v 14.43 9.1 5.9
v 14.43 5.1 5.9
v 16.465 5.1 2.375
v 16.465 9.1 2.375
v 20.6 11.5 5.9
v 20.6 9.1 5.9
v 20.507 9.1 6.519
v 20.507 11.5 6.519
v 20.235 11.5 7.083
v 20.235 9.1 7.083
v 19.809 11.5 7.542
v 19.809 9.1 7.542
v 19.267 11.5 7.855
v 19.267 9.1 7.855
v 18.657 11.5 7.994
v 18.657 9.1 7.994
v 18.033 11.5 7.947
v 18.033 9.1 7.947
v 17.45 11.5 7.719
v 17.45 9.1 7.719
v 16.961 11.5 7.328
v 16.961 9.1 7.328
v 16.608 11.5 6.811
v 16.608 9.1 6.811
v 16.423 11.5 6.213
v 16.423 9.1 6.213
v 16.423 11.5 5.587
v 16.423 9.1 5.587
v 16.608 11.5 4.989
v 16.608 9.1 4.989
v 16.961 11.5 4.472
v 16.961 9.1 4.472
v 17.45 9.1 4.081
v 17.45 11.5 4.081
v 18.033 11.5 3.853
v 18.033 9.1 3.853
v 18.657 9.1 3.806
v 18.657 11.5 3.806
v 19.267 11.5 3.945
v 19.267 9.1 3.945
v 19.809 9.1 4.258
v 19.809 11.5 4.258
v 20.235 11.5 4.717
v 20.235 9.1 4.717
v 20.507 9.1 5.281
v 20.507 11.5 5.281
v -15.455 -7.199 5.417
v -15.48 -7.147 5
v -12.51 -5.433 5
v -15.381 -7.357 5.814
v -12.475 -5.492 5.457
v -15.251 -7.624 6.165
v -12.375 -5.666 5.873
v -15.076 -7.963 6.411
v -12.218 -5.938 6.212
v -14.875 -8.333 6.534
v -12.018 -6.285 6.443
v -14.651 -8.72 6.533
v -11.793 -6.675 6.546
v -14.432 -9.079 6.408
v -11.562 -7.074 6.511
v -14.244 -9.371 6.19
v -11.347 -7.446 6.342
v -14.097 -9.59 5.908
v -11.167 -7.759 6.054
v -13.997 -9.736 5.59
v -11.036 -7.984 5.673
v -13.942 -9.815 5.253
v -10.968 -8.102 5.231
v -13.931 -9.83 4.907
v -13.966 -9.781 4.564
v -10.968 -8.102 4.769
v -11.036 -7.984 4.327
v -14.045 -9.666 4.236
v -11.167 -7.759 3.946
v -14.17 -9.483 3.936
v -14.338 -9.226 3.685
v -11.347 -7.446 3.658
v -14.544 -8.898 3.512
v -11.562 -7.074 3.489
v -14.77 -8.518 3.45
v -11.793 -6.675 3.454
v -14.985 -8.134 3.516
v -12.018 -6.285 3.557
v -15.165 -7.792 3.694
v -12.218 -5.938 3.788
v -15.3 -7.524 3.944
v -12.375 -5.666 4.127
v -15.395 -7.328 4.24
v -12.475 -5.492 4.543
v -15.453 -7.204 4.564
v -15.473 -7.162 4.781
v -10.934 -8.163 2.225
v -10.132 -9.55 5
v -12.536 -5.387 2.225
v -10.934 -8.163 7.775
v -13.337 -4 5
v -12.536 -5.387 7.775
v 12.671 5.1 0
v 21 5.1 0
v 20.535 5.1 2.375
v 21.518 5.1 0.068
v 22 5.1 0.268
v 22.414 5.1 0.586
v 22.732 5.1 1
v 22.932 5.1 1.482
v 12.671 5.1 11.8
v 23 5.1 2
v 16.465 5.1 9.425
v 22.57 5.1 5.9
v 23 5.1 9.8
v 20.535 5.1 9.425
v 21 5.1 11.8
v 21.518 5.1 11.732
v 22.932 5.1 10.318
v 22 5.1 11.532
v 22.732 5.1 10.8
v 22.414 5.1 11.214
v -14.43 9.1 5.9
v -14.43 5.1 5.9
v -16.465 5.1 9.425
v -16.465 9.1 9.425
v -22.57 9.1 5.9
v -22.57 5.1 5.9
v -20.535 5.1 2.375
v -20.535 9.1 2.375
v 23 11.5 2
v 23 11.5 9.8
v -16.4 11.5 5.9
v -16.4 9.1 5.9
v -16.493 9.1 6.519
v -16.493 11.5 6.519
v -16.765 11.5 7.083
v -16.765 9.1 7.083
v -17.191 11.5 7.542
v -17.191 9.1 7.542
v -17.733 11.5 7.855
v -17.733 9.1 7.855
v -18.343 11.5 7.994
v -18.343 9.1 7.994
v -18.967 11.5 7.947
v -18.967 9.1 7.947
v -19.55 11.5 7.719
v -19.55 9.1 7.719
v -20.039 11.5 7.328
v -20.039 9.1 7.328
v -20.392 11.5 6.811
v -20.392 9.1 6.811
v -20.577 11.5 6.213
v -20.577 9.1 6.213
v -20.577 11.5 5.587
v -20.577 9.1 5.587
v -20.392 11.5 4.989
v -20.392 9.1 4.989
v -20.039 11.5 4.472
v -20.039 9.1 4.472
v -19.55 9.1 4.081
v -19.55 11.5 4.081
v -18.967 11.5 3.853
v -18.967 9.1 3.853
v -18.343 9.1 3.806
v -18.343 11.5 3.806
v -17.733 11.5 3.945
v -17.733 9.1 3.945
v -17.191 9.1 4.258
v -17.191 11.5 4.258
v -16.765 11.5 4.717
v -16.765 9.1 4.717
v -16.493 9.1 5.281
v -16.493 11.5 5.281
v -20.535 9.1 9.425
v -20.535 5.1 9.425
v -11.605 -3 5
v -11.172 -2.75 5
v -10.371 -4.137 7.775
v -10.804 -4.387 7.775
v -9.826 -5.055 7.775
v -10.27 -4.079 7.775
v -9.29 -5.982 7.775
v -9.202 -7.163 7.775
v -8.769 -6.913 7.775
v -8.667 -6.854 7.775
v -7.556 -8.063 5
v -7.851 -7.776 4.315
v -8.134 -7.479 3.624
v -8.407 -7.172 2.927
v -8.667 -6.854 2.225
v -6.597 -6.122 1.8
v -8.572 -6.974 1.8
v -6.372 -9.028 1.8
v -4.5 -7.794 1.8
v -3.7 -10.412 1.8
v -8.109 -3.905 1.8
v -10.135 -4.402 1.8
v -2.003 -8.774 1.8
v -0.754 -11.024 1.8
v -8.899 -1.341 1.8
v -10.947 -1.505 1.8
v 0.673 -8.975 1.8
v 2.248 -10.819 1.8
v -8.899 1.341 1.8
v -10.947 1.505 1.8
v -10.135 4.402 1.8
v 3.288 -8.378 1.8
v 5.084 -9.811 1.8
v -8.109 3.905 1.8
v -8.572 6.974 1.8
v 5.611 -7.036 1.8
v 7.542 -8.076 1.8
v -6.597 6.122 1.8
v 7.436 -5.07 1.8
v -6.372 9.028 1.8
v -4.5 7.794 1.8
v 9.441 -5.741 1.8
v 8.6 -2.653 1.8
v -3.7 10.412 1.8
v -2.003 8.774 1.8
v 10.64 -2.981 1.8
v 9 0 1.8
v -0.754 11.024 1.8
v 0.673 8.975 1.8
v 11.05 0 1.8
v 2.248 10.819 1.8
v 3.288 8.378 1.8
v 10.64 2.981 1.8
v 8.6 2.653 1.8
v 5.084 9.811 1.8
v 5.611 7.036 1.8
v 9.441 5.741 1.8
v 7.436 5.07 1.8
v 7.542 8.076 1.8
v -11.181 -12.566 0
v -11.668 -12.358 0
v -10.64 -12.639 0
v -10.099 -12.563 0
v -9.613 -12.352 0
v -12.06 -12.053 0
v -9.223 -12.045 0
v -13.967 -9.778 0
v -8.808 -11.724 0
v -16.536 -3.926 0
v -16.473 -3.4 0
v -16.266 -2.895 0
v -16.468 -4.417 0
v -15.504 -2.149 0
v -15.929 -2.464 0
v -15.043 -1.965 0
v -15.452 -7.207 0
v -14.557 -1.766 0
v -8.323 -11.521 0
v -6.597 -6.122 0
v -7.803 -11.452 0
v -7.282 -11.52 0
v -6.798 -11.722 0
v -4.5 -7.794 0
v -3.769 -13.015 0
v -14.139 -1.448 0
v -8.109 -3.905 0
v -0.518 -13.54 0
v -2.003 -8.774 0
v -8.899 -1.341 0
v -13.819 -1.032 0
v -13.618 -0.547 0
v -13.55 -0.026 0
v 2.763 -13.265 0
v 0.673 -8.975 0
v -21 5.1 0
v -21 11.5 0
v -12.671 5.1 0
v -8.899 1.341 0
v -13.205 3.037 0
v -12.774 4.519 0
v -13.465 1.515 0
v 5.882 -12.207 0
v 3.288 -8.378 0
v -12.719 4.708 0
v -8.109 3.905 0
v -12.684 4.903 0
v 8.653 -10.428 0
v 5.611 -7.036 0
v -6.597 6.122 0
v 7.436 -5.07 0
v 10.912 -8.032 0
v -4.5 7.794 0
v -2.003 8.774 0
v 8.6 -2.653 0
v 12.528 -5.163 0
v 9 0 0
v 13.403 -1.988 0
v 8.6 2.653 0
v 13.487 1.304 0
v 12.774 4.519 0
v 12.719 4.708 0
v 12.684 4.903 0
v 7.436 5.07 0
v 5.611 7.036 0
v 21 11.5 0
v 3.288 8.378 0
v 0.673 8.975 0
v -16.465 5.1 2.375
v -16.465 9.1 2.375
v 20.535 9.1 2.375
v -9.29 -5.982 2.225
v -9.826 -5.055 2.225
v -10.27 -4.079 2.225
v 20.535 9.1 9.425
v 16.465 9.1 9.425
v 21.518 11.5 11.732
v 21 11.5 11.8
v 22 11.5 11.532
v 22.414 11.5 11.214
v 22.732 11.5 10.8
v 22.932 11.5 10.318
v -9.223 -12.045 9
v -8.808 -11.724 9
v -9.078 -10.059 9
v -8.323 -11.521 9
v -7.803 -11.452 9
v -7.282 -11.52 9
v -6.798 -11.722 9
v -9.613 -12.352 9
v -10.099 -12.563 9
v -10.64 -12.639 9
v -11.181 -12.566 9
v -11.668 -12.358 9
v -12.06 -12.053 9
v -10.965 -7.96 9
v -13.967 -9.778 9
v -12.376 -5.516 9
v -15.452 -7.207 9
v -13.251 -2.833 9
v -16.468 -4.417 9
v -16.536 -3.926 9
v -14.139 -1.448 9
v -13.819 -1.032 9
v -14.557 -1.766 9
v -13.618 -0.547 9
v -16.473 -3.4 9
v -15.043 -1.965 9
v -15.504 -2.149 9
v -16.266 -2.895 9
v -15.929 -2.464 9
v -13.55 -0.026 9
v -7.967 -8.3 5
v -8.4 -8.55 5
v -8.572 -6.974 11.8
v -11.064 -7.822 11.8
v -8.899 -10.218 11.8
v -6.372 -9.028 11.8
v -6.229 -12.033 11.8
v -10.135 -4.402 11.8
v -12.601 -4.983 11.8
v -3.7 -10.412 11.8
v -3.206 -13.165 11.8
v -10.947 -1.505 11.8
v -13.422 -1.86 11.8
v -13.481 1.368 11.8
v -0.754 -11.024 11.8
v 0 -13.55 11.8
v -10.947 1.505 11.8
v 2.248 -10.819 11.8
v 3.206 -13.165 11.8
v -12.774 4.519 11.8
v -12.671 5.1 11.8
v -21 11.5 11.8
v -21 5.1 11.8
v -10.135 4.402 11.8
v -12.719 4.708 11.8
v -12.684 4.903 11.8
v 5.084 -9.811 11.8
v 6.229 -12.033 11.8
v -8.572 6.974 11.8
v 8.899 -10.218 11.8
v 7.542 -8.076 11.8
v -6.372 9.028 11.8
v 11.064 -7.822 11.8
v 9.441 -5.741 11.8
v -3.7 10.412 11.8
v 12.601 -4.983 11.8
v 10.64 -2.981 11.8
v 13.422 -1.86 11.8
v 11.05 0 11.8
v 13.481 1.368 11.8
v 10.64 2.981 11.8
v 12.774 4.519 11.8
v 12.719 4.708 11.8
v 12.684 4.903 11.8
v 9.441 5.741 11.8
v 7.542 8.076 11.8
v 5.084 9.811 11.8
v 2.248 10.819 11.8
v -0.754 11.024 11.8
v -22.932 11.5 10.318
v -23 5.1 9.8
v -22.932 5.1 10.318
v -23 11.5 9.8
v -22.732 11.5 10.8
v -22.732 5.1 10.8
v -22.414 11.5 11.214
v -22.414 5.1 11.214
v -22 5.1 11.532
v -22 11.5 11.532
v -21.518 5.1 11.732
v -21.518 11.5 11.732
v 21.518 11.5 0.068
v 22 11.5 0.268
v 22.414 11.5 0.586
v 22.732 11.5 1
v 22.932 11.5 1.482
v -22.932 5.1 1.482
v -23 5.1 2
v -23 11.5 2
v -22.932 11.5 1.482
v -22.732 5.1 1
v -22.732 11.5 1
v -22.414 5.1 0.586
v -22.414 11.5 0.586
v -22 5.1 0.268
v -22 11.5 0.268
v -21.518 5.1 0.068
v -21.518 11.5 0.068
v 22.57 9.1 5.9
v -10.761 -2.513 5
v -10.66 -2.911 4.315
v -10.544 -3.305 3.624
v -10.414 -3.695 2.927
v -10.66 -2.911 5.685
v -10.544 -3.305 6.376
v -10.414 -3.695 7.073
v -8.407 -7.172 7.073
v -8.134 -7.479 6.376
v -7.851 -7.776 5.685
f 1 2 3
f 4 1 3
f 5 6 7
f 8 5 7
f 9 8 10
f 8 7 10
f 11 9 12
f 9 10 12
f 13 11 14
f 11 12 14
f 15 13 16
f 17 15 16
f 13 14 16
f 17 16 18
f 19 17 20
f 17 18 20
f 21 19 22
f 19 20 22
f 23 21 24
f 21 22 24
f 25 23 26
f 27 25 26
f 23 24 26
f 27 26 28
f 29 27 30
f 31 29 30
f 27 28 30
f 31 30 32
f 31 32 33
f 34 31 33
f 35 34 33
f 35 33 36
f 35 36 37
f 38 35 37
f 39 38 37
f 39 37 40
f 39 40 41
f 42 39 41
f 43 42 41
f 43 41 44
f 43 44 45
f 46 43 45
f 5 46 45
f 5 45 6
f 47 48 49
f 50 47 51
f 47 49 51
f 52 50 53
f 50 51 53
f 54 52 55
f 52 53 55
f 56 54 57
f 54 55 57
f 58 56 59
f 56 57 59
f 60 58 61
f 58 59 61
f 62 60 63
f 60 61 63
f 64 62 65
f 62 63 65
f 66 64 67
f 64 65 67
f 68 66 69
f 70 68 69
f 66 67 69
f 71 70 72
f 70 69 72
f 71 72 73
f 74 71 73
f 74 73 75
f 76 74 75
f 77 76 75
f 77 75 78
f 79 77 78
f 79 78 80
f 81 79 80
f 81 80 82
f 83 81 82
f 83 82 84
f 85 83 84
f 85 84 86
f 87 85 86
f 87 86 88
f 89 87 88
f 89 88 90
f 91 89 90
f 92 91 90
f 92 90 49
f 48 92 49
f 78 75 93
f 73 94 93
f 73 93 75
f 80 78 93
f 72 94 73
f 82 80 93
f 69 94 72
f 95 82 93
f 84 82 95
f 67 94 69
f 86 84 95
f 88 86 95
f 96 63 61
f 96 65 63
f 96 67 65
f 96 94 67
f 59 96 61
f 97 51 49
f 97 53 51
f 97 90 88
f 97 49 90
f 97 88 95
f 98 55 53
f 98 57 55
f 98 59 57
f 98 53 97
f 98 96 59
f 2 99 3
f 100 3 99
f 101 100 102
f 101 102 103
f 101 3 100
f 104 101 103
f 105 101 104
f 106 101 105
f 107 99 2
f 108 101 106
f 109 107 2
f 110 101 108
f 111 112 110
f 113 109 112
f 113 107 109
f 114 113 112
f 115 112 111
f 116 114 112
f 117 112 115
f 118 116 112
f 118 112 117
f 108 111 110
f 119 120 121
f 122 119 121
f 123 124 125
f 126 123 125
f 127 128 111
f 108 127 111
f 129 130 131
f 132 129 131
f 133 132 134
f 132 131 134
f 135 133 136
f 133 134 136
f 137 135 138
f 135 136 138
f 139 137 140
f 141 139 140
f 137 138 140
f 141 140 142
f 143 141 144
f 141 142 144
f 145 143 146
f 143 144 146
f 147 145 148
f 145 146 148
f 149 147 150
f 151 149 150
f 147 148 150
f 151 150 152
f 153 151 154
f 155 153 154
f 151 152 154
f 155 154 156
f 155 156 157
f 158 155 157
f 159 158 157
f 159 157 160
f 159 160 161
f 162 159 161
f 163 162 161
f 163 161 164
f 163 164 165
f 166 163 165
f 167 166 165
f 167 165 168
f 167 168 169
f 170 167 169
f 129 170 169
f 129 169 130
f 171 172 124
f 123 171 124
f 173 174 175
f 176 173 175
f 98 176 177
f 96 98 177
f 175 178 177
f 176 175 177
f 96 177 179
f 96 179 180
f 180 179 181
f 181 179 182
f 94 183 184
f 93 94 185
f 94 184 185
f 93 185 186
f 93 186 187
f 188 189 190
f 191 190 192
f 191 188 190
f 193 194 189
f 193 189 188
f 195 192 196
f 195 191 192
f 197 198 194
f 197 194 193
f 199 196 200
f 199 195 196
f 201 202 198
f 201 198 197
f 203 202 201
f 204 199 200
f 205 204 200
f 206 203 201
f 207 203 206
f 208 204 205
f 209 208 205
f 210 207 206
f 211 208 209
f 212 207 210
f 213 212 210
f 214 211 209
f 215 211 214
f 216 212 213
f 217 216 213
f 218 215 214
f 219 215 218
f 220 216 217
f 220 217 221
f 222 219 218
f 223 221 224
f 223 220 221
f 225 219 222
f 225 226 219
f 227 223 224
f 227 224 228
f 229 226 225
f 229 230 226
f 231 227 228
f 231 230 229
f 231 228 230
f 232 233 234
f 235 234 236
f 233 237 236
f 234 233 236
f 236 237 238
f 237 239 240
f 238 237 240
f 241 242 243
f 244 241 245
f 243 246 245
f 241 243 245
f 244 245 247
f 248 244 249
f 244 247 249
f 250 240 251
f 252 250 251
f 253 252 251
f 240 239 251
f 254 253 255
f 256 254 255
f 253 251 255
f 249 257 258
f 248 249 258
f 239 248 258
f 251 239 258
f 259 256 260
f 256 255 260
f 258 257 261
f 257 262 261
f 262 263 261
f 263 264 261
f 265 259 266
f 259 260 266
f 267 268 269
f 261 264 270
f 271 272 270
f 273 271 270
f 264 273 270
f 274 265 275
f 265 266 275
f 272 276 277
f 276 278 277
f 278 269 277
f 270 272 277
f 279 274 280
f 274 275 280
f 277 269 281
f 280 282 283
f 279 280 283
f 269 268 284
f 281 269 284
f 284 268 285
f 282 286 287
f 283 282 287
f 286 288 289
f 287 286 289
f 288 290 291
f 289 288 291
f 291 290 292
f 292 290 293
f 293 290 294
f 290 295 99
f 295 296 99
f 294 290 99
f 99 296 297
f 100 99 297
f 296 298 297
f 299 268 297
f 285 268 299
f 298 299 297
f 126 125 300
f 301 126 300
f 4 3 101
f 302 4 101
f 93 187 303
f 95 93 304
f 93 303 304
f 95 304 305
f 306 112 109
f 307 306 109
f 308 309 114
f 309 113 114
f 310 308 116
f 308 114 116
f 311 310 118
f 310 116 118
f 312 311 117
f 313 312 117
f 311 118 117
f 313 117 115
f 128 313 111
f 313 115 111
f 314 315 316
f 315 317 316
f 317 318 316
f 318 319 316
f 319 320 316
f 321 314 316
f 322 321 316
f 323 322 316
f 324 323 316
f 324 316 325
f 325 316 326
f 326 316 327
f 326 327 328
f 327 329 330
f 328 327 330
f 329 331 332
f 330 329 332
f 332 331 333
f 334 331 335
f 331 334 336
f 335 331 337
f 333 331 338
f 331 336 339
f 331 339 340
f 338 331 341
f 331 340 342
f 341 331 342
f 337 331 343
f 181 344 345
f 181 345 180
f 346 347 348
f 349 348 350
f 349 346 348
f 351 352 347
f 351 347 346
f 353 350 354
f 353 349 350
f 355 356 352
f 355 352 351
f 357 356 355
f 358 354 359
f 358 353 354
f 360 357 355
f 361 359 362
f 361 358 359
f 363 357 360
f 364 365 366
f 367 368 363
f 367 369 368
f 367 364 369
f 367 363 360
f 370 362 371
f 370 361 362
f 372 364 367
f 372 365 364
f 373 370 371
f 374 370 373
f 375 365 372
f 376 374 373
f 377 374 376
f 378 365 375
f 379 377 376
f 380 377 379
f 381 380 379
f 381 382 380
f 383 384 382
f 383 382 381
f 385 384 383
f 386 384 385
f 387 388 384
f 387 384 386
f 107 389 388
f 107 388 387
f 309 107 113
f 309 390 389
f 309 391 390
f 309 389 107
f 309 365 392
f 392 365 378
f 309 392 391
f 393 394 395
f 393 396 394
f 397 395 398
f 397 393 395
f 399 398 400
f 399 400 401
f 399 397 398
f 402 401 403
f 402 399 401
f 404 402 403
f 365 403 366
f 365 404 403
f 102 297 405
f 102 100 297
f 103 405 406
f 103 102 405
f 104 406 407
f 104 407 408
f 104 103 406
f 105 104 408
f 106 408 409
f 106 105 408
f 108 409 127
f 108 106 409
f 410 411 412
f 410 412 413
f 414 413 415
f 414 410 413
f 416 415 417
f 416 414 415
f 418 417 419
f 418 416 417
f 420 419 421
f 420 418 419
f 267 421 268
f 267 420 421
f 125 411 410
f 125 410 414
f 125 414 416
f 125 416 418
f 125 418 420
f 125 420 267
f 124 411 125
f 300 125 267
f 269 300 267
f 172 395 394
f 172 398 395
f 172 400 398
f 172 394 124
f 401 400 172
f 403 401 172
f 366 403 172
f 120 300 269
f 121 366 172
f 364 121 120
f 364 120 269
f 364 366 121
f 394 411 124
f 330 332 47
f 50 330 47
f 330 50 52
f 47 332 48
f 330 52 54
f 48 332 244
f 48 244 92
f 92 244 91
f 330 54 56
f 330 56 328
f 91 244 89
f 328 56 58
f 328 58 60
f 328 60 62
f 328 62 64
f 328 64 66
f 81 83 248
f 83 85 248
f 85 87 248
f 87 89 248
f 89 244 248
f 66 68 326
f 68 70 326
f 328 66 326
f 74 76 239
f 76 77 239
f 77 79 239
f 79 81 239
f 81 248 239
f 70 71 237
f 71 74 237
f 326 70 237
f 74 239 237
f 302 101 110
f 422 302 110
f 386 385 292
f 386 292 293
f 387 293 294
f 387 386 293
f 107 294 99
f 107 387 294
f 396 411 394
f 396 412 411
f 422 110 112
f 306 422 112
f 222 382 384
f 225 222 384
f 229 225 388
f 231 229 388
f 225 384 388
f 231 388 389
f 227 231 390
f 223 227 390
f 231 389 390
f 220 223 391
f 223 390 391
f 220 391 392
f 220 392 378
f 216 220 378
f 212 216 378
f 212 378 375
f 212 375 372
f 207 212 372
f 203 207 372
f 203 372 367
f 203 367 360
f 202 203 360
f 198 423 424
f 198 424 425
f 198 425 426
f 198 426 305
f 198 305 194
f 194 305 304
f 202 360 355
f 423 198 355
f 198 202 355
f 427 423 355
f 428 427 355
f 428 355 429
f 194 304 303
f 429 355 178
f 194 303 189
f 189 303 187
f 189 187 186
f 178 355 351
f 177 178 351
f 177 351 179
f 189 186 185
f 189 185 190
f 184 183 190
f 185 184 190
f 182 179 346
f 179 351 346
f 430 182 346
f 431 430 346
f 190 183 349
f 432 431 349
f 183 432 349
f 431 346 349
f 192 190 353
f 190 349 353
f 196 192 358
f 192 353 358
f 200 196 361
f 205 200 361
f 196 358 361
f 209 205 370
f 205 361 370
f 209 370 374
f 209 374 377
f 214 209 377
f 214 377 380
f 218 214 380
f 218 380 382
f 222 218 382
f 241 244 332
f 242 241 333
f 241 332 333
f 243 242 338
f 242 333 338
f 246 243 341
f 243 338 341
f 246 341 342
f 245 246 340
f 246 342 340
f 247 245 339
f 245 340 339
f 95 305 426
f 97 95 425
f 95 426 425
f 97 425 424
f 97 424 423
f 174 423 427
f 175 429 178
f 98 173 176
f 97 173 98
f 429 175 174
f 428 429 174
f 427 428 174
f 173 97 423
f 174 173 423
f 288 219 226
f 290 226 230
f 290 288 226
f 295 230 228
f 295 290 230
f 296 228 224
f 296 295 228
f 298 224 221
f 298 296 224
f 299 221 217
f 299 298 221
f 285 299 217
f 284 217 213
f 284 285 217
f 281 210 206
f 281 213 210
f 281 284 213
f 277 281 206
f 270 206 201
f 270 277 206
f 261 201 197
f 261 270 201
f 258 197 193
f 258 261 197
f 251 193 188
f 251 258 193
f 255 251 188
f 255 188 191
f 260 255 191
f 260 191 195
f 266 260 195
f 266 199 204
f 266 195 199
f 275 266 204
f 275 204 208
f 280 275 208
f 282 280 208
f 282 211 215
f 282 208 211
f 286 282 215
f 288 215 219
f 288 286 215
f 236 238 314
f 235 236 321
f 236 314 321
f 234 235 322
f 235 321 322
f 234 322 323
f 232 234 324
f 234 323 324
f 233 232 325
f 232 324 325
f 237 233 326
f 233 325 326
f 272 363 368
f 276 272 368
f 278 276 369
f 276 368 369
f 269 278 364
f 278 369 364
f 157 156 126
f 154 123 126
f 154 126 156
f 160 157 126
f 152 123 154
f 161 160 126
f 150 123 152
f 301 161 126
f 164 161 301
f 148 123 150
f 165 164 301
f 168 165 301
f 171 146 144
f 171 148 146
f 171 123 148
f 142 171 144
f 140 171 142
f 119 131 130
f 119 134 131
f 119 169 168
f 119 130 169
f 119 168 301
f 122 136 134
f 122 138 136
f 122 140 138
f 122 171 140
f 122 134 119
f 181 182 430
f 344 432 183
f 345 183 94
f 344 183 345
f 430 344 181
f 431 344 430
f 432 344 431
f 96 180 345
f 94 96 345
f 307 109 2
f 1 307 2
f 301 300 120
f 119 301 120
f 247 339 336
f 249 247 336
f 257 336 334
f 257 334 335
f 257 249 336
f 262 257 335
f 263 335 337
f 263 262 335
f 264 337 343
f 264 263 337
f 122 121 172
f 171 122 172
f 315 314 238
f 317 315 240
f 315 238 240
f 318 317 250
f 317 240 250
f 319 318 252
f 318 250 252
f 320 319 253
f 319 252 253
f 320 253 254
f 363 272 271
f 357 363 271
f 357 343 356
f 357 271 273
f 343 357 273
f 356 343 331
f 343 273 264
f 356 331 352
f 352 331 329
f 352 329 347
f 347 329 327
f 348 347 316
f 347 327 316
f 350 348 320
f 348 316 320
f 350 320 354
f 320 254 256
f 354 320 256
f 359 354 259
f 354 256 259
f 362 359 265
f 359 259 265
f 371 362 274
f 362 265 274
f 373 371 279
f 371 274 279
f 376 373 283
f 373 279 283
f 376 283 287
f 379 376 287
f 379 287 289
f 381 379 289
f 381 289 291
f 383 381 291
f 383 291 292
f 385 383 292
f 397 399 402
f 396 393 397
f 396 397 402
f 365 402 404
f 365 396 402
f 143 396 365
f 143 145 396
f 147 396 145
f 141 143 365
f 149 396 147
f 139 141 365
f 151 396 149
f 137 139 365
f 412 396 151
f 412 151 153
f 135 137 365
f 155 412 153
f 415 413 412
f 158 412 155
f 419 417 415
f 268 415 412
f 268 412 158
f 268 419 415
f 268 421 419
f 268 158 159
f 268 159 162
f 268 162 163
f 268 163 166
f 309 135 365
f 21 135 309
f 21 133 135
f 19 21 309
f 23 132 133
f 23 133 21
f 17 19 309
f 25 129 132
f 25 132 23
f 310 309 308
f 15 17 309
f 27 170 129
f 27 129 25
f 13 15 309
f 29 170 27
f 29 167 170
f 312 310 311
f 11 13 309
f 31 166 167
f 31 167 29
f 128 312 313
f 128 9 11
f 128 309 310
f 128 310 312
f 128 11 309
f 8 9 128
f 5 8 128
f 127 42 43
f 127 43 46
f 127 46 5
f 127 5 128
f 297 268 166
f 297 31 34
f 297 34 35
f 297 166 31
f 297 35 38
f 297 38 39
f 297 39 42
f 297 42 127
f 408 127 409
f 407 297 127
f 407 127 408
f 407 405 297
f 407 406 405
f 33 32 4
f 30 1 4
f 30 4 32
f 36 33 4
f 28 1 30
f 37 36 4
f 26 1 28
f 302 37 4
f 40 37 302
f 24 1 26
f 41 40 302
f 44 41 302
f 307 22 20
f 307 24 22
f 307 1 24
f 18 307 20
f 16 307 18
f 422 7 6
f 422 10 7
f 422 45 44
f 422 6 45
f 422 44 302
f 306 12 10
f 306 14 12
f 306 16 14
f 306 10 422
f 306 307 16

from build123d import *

# Parameters (mm, degrees)
PAD002_DEPTH    = 5.55
POCKET001_DEPTH = 0.5
POCKET002_DEPTH = 0.5
PAD003_DEPTH    = 2.5
PAD001_DEPTH    = 9
SKETCH_R        = 9
PAD_DEPTH       = 11.8
SKETCH001_R     = 11.05
POCKET_DEPTH    = 10
SKETCH010_R     = 1.55
POCKET003_DEPTH = 5
FILLET_R        = 1.8
SKETCH012_W     = 10.3286741025
SKETCH012_H     = 11.8
PAD004_DEPTH    = 2.4
SKETCH011_R     = 2.1
POCKET004_DEPTH = 6.4010000001
POCKET005_DEPTH = 4
FILLET001_R     = 2
FILLET002_R     = 2
FILLET003_R     = 2


with BuildPart() as pad003:
    # Sketch004 → Pad002 (new body)
    with BuildSketch(Plane.XY.offset(2.225)):
        Polygon((-11.1717282118, -2.7499991288), (-7.9674332118, -8.3000008712), (-8.4004459137, -8.5500008712), (-11.6047409137, -2.9999991288), align=None)
    extrude(amount=PAD002_DEPTH)

    # Sketch006 → Pocket001 (cut)
    with BuildSketch(Plane(origin=(-9.5695807118, -5.525, 2.225), x_dir=(-0.5, 0.8660254038, 0), z_dir=(0.8660254038, 0.5, 0))):
        Polygon((-3.204295, 2.7750019602), (-1.6021491347, 5.55), (-3.204295, 5.55), align=None)
        Polygon((1.6021478772, 0), (3.204295, 0), (3.204295, 2.7750019602), align=None)
    extrude(amount=-POCKET001_DEPTH, mode=Mode.SUBTRACT)

    # Sketch008 → Pocket002 (cut)
    with BuildSketch(Plane(origin=(-9.5695807118, -5.525, 2.225), x_dir=(-0.5, 0.8660254038, 0), z_dir=(0.8660254038, 0.5, 0))):
        Polygon((1.6021478772, 5.5500030493), (3.204295, 5.5500030493), (3.204295, 2.7750019602), align=None)
        Polygon((-1.6021478772, 0), (-3.2042957545, 0), (-3.2042957545, 2.7750015246), align=None)
    extrude(amount=-POCKET002_DEPTH, mode=Mode.SUBTRACT)

    # Sketch009 → Pad003 (new body, symmetric)
    with BuildSketch(Plane(origin=(-9.5695807118, -5.525, 2.225), x_dir=(-0.5, 0.8660254038, 0), z_dir=(0.8660254038, 0.5, 0))):
        Polygon((1.6021491347, -7.4054e-06), (3.2042982695, 2.7749962973), (1.6021491347, 5.55), (-1.6021491347, 5.55), (-3.2042982695, 2.7749962973), (-1.6021491347, -7.4054e-06), align=None)
    extrude(amount=PAD003_DEPTH, both=True)


with BuildPart() as pad001:
    # Sketch003 → Pad001 (new body)
    with BuildSketch(Plane.XY):
        with BuildLine():
            ThreePointArc((-10.9554657182, -1.442314424), (-9.5695807118, -5.525), (-6.7268137905, -8.7665544102))
            Line((-10.3793823646, -13.526674452), (-6.7268137905, -8.7665544102))
            ThreePointArc((-16.9041348864, -2.2254715773), (-14.7657331345, -8.525), (-10.3793823646, -13.526674452))
            Line((-10.9554657182, -1.442314424), (-16.9041348864, -2.2254715773))
        make_face()
    extrude(amount=PAD001_DEPTH)


with BuildPart() as fillet003:
    # Sketch → Pad (new body)
    with BuildSketch(Plane.XY):
        with BuildLine():
            Line((-23, 11.5), (23, 11.5))
            Line((23, 11.5), (23, 7.5))
            Line((23, 7.5), (15, 7.5))
            Line((12.6713258975, 7.5), (15, 7.5))
            Line((12.6713258975, 4.8), (12.6713258975, 7.5))
            ThreePointArc((-12.6713258975, 4.8), (0, -13.55), (12.6713258975, 4.8))
            Line((-12.6713258975, 7.5), (-12.6713258975, 4.8))
            Line((-15, 7.5), (-12.6713258975, 7.5))
            Line((-15, 7.5), (-23, 7.5))
            Line((-23, 7.5), (-23, 11.5))
        make_face()
        Circle(SKETCH_R, mode=Mode.SUBTRACT)
    extrude(amount=PAD_DEPTH)

    # Sketch001 → Pocket (cut)
    with BuildSketch(Plane.XY.offset(11.8)):
        Circle(SKETCH001_R)
    extrude(amount=-POCKET_DEPTH, mode=Mode.SUBTRACT)

    # Fusion: union Pad001
    add(pad001.part)

    # Cut: cut Pad003
    add(pad003.part, mode=Mode.SUBTRACT)

    # Sketch010 → Pocket003 (cut)
    with BuildSketch(Plane(origin=(-11.7346442213, -6.775, 0), x_dir=(-0.5, 0.8660254038, 0), z_dir=(0.8660254038, 0.5, 0))):
        with Locations((0, 4.9999962973)):
            Circle(SKETCH010_R)
    extrude(amount=-POCKET003_DEPTH, mode=Mode.SUBTRACT)

    # Fillet
    fillet_edges = [fillet003.edges().sort_by_distance(p)[0] for p in [
        (-12.671326, 4.8, 5.9),
        (12.671326, 4.8, 5.9),
    ]]
    fillet(fillet_edges, radius=FILLET_R)

    # Sketch012 → Pad004 (new body)
    with BuildSketch(Plane.XZ.offset(-7.5)):
        with Locations((-17.8356629487, 5.9)):
            Rectangle(SKETCH012_W, SKETCH012_H)
        with Locations((17.8356629487, 5.9)):
            Rectangle(SKETCH012_W, SKETCH012_H)
    extrude(amount=PAD004_DEPTH)

    # Sketch011 → Pocket004 (cut, through all)
    with BuildSketch(Plane.XZ.offset(-5.1)):
        with Locations((-18.5, 5.9)):
            Circle(SKETCH011_R)
        with Locations((18.5, 5.9)):
            Circle(SKETCH011_R)
    extrude(amount=-POCKET004_DEPTH, mode=Mode.SUBTRACT)

    # Sketch013 → Pocket005 (cut)
    with BuildSketch(Plane.XZ.offset(-5.1)):
        Polygon((-14.4296806022, 5.9), (-16.4648403011, 9.425), (-20.5351596989, 9.425), (-22.5703193978, 5.9), (-20.5351596989, 2.375), (-16.4648403011, 2.375), align=None)
        Polygon((22.5703193978, 5.9), (20.5351596989, 9.425), (16.4648403011, 9.425), (14.4296806022, 5.9), (16.4648403011, 2.375), (20.5351596989, 2.375), align=None)
    extrude(amount=-POCKET005_DEPTH, mode=Mode.SUBTRACT)

    # Fillet001
    fillet001_edges = [fillet003.edges().sort_by_distance(p)[0] for p in [
        (-23, 6.3, 0),
        (-23, 9.5, 0),
        (-23, 9.5, 11.8),
        (-23, 6.3, 11.8),
        (23, 6.3, 0),
        (23, 9.5, 0),
        (23, 9.5, 11.8),
        (23, 6.3, 11.8),
    ]]
    fillet(fillet001_edges, radius=FILLET001_R)

    # Fillet002
    fillet002_edges = [fillet003.edges().sort_by_distance(p)[0] for p in [
        (-8.248717, -10.749938, 4.5),
        (-13.434078, -1.76863, 4.5),
    ]]
    fillet(fillet002_edges, radius=FILLET002_R)

    # Fillet003
    fillet003_edges = [fillet003.edges().sort_by_distance(p)[0] for p in [
        (-10.379382, -13.526674, 4.5),
        (-16.904135, -2.225472, 4.5),
    ]]
    fillet(fillet003_edges, radius=FILLET003_R)


solid = fillet003.part
